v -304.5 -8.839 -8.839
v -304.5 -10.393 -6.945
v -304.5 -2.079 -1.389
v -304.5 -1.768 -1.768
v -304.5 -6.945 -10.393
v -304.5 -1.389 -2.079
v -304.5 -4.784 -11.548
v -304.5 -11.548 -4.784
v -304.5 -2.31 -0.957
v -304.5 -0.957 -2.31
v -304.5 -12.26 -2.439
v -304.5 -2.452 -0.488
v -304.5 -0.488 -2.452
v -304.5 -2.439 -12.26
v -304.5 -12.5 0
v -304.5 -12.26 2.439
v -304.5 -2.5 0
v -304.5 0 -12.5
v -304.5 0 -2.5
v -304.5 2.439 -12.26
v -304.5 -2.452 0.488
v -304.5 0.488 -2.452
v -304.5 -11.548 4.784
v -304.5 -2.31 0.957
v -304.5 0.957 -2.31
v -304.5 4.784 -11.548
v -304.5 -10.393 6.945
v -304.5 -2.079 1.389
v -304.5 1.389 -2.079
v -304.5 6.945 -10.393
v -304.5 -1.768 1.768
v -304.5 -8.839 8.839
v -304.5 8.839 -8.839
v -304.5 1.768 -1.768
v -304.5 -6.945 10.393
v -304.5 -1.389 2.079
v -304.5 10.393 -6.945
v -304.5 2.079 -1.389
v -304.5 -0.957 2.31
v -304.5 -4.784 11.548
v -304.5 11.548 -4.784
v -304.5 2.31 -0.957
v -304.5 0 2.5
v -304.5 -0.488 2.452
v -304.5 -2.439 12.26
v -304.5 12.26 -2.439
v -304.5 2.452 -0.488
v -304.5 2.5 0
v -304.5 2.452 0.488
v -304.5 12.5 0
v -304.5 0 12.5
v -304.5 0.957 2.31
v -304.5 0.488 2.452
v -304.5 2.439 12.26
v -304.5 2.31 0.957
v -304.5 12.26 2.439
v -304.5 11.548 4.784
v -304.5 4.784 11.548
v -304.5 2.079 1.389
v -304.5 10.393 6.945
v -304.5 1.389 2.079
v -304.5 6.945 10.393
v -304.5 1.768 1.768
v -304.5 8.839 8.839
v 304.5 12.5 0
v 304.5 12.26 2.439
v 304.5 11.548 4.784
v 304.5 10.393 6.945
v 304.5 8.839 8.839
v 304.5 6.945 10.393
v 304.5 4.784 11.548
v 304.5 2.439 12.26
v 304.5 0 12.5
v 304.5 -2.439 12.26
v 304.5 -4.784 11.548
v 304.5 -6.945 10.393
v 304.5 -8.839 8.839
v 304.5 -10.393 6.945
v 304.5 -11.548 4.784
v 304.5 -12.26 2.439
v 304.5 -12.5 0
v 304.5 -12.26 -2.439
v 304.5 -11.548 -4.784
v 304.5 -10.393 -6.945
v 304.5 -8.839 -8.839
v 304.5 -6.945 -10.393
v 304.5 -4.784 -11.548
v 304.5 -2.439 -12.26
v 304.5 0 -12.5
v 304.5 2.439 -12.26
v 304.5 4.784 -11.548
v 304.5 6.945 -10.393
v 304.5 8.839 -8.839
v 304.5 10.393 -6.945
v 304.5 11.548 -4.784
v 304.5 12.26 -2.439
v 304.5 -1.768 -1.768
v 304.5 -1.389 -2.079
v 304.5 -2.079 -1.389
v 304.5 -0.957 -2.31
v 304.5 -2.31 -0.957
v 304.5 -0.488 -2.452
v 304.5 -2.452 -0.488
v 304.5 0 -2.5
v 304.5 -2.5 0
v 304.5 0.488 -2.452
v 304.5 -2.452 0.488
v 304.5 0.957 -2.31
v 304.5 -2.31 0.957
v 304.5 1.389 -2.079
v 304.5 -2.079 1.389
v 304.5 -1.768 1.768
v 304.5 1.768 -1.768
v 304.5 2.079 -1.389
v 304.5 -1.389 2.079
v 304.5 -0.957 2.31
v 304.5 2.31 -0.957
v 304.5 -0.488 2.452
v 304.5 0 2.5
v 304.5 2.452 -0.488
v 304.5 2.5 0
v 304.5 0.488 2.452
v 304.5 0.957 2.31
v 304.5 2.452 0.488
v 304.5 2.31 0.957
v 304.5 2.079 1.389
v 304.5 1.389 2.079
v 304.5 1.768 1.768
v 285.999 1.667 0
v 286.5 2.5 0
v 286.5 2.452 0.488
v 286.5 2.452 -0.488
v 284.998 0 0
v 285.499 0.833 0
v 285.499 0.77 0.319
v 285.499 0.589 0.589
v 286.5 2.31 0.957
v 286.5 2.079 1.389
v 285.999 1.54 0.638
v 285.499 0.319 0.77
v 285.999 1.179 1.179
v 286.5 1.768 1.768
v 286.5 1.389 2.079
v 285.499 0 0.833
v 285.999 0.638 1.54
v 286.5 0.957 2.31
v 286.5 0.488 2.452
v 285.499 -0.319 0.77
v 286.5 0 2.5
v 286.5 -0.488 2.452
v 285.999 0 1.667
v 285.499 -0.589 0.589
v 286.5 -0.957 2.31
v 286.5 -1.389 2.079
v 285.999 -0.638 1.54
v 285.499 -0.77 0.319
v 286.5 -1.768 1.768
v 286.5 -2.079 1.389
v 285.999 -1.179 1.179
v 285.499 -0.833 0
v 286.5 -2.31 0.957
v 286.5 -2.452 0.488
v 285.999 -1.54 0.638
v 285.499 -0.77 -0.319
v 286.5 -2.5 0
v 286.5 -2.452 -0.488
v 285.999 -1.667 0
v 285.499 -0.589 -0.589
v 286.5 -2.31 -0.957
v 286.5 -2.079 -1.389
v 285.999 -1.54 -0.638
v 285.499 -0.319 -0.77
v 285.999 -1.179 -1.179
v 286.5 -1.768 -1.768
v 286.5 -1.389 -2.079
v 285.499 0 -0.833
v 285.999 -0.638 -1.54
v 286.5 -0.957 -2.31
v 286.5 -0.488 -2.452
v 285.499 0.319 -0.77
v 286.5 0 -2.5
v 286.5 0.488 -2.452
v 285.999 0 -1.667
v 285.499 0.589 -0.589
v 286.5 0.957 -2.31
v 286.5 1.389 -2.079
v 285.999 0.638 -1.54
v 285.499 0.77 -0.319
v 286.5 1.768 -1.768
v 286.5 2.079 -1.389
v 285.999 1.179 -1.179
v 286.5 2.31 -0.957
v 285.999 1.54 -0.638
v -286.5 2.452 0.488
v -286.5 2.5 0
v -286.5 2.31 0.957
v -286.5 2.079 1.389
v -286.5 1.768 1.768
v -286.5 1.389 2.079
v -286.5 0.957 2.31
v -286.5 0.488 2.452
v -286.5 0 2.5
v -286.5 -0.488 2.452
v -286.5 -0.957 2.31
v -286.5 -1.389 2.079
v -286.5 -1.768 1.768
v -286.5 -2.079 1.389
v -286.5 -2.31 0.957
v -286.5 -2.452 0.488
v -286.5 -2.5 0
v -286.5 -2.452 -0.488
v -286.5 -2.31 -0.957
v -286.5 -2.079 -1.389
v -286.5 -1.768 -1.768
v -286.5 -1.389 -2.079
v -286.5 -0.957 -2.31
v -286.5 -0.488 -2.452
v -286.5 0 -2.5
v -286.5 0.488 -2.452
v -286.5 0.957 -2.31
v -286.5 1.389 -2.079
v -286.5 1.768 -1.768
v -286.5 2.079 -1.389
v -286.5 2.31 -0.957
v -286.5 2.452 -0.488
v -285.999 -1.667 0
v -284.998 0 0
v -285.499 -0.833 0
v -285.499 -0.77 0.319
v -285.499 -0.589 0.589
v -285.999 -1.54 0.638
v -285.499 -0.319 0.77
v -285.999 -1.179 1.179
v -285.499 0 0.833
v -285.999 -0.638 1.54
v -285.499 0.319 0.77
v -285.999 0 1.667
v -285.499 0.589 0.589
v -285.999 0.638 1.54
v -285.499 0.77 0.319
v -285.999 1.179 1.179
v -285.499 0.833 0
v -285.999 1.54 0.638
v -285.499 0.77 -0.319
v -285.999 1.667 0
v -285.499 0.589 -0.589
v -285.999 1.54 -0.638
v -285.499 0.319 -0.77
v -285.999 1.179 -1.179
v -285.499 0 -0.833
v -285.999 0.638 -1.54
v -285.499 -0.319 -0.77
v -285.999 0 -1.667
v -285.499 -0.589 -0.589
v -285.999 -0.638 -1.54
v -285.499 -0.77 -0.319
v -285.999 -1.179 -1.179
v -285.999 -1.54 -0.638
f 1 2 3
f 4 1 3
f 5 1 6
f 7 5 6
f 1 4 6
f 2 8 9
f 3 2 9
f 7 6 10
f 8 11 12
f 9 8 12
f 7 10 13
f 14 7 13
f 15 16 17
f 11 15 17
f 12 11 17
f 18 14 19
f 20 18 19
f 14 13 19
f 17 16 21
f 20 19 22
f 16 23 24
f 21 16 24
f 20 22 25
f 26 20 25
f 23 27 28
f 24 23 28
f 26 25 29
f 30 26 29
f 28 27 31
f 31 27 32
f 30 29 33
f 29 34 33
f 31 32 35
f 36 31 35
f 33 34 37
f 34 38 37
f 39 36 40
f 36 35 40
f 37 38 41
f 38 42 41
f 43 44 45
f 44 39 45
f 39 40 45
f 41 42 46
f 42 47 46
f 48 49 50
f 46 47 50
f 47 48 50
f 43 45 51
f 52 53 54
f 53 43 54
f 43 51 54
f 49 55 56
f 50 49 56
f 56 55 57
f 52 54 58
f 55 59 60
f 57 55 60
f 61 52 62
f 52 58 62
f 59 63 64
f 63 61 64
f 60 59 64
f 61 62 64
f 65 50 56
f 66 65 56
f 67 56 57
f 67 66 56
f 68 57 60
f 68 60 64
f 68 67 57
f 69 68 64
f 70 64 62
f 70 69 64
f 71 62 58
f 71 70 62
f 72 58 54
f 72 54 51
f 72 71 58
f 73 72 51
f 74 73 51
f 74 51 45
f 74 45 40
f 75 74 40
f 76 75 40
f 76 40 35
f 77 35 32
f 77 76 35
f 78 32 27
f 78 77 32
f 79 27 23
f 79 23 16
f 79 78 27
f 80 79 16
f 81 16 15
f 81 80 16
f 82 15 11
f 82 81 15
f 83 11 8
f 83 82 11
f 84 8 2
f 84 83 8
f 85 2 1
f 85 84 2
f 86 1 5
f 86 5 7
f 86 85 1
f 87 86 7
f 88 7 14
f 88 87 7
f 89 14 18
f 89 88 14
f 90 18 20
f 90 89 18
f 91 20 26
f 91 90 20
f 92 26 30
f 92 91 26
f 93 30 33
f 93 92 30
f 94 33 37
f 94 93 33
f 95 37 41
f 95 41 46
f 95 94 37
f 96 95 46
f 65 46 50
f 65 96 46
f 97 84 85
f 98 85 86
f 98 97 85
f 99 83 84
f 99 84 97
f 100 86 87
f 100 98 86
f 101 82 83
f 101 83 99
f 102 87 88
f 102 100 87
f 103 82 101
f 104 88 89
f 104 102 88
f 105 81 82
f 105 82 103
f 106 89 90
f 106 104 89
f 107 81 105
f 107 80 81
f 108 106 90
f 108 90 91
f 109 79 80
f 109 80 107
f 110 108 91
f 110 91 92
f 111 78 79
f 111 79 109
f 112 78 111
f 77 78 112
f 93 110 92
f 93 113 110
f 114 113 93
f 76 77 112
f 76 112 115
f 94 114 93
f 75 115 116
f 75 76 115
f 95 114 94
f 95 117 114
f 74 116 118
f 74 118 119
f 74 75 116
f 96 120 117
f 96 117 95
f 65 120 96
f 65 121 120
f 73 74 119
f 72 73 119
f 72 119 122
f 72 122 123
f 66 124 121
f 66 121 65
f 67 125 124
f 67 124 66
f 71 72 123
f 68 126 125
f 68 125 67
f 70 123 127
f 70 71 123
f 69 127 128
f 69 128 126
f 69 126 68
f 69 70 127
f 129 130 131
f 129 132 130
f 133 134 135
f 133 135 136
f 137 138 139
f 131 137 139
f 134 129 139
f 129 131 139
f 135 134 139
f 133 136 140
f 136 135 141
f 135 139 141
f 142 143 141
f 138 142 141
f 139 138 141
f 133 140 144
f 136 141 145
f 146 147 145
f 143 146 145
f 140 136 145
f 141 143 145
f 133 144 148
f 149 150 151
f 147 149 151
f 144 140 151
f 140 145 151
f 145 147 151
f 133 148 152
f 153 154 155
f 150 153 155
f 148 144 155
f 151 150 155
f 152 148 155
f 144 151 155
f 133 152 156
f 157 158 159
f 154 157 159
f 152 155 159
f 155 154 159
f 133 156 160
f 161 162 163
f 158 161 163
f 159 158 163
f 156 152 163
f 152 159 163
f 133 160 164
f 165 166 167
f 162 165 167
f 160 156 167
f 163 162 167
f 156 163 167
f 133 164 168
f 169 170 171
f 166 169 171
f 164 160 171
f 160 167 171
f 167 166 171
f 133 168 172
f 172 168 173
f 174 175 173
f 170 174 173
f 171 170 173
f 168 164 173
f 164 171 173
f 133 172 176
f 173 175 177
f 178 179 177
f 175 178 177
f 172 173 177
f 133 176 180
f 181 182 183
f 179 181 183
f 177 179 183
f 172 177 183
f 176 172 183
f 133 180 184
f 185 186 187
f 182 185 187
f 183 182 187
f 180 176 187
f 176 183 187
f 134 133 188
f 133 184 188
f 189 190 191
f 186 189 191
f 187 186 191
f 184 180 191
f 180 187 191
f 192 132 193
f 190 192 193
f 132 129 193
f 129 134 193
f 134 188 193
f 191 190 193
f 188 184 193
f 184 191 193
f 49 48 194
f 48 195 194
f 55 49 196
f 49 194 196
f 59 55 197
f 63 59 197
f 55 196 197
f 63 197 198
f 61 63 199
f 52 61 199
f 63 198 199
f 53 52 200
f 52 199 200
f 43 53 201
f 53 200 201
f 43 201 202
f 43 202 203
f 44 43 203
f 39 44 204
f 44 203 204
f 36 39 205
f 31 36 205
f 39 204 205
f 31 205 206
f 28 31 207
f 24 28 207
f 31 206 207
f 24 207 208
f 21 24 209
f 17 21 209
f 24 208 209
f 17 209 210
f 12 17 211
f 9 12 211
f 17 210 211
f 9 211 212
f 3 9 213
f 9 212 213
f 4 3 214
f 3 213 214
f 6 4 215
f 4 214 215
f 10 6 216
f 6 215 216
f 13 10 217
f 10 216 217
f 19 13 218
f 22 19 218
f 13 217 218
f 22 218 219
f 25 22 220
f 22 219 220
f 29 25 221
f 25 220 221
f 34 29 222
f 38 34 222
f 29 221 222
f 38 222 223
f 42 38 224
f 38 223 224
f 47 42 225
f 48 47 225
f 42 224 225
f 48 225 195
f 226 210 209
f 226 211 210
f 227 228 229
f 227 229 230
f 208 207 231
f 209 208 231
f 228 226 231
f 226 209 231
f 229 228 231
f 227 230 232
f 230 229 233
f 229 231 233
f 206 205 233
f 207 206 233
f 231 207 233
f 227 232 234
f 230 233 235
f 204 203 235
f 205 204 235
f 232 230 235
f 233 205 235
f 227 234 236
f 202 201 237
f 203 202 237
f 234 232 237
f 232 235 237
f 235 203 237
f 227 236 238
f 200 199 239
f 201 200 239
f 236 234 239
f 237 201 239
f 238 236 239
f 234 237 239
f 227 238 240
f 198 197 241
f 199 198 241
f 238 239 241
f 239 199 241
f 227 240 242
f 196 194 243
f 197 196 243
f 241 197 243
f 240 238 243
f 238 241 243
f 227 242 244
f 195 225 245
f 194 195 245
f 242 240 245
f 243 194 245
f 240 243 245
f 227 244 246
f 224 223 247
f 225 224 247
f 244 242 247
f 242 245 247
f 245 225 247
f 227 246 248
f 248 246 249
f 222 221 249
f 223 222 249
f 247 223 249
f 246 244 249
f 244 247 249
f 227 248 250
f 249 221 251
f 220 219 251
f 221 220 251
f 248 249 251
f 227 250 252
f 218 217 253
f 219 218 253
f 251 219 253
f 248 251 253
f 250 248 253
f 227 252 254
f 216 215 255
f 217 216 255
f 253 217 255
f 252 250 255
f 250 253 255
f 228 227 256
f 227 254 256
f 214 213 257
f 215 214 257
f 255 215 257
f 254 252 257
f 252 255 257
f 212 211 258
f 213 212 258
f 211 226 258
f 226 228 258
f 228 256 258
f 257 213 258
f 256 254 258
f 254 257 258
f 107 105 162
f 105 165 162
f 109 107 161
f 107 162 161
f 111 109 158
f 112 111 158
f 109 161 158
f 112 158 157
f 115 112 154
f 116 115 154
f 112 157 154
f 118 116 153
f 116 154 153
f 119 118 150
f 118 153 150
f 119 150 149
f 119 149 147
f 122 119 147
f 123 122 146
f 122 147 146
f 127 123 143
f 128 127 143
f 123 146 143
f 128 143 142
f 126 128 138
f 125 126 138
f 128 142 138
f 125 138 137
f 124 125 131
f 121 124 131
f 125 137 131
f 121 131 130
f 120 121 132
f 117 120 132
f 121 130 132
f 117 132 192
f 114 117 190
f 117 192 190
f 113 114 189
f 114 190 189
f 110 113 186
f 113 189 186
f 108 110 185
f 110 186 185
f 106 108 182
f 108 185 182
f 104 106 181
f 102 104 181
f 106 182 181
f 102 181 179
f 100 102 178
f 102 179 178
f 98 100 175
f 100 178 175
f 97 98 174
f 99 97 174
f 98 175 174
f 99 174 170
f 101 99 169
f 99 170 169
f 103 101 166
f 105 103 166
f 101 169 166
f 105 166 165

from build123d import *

# Parameters (mm, degrees)
F0_R           = 12.5
F1_DEPTH       = 304.5
F4_D           = 5
F4_DEPTH       = 18
F4_TIP         = 1.5021515476
F4_ON_F2_D     = 5
F4_ON_F2_DEPTH = 18
F4_ON_F2_TIP   = 1.5021515476


with BuildPart() as f1:
    # F0 (on Right) → F1 (new body, symmetric)
    with BuildSketch(Plane.YZ):
        Circle(F0_R)
    extrude(amount=F1_DEPTH, both=True)

    # F4
    with Locations(Plane(origin=(-304.5, 0, 0), x_dir=(0, -1, 0), z_dir=(-1, 0, 0))):
        with Locations((0, 0)):
            Hole(F4_D / 2, depth=F4_DEPTH)
            with Locations((0, 0, -(F4_DEPTH + F4_TIP / 2))):  # 118° drill point
                Cone(0, F4_D / 2, F4_TIP, mode=Mode.SUBTRACT)

    # F4 on F2
    with Locations(Plane.YZ.offset(304.5)):
        with Locations((0, 0)):
            Hole(F4_ON_F2_D / 2, depth=F4_ON_F2_DEPTH)
            with Locations((0, 0, -(F4_ON_F2_DEPTH + F4_ON_F2_TIP / 2))):  # 118° drill point
                Cone(0, F4_ON_F2_D / 2, F4_ON_F2_TIP, mode=Mode.SUBTRACT)


solid = f1.part
